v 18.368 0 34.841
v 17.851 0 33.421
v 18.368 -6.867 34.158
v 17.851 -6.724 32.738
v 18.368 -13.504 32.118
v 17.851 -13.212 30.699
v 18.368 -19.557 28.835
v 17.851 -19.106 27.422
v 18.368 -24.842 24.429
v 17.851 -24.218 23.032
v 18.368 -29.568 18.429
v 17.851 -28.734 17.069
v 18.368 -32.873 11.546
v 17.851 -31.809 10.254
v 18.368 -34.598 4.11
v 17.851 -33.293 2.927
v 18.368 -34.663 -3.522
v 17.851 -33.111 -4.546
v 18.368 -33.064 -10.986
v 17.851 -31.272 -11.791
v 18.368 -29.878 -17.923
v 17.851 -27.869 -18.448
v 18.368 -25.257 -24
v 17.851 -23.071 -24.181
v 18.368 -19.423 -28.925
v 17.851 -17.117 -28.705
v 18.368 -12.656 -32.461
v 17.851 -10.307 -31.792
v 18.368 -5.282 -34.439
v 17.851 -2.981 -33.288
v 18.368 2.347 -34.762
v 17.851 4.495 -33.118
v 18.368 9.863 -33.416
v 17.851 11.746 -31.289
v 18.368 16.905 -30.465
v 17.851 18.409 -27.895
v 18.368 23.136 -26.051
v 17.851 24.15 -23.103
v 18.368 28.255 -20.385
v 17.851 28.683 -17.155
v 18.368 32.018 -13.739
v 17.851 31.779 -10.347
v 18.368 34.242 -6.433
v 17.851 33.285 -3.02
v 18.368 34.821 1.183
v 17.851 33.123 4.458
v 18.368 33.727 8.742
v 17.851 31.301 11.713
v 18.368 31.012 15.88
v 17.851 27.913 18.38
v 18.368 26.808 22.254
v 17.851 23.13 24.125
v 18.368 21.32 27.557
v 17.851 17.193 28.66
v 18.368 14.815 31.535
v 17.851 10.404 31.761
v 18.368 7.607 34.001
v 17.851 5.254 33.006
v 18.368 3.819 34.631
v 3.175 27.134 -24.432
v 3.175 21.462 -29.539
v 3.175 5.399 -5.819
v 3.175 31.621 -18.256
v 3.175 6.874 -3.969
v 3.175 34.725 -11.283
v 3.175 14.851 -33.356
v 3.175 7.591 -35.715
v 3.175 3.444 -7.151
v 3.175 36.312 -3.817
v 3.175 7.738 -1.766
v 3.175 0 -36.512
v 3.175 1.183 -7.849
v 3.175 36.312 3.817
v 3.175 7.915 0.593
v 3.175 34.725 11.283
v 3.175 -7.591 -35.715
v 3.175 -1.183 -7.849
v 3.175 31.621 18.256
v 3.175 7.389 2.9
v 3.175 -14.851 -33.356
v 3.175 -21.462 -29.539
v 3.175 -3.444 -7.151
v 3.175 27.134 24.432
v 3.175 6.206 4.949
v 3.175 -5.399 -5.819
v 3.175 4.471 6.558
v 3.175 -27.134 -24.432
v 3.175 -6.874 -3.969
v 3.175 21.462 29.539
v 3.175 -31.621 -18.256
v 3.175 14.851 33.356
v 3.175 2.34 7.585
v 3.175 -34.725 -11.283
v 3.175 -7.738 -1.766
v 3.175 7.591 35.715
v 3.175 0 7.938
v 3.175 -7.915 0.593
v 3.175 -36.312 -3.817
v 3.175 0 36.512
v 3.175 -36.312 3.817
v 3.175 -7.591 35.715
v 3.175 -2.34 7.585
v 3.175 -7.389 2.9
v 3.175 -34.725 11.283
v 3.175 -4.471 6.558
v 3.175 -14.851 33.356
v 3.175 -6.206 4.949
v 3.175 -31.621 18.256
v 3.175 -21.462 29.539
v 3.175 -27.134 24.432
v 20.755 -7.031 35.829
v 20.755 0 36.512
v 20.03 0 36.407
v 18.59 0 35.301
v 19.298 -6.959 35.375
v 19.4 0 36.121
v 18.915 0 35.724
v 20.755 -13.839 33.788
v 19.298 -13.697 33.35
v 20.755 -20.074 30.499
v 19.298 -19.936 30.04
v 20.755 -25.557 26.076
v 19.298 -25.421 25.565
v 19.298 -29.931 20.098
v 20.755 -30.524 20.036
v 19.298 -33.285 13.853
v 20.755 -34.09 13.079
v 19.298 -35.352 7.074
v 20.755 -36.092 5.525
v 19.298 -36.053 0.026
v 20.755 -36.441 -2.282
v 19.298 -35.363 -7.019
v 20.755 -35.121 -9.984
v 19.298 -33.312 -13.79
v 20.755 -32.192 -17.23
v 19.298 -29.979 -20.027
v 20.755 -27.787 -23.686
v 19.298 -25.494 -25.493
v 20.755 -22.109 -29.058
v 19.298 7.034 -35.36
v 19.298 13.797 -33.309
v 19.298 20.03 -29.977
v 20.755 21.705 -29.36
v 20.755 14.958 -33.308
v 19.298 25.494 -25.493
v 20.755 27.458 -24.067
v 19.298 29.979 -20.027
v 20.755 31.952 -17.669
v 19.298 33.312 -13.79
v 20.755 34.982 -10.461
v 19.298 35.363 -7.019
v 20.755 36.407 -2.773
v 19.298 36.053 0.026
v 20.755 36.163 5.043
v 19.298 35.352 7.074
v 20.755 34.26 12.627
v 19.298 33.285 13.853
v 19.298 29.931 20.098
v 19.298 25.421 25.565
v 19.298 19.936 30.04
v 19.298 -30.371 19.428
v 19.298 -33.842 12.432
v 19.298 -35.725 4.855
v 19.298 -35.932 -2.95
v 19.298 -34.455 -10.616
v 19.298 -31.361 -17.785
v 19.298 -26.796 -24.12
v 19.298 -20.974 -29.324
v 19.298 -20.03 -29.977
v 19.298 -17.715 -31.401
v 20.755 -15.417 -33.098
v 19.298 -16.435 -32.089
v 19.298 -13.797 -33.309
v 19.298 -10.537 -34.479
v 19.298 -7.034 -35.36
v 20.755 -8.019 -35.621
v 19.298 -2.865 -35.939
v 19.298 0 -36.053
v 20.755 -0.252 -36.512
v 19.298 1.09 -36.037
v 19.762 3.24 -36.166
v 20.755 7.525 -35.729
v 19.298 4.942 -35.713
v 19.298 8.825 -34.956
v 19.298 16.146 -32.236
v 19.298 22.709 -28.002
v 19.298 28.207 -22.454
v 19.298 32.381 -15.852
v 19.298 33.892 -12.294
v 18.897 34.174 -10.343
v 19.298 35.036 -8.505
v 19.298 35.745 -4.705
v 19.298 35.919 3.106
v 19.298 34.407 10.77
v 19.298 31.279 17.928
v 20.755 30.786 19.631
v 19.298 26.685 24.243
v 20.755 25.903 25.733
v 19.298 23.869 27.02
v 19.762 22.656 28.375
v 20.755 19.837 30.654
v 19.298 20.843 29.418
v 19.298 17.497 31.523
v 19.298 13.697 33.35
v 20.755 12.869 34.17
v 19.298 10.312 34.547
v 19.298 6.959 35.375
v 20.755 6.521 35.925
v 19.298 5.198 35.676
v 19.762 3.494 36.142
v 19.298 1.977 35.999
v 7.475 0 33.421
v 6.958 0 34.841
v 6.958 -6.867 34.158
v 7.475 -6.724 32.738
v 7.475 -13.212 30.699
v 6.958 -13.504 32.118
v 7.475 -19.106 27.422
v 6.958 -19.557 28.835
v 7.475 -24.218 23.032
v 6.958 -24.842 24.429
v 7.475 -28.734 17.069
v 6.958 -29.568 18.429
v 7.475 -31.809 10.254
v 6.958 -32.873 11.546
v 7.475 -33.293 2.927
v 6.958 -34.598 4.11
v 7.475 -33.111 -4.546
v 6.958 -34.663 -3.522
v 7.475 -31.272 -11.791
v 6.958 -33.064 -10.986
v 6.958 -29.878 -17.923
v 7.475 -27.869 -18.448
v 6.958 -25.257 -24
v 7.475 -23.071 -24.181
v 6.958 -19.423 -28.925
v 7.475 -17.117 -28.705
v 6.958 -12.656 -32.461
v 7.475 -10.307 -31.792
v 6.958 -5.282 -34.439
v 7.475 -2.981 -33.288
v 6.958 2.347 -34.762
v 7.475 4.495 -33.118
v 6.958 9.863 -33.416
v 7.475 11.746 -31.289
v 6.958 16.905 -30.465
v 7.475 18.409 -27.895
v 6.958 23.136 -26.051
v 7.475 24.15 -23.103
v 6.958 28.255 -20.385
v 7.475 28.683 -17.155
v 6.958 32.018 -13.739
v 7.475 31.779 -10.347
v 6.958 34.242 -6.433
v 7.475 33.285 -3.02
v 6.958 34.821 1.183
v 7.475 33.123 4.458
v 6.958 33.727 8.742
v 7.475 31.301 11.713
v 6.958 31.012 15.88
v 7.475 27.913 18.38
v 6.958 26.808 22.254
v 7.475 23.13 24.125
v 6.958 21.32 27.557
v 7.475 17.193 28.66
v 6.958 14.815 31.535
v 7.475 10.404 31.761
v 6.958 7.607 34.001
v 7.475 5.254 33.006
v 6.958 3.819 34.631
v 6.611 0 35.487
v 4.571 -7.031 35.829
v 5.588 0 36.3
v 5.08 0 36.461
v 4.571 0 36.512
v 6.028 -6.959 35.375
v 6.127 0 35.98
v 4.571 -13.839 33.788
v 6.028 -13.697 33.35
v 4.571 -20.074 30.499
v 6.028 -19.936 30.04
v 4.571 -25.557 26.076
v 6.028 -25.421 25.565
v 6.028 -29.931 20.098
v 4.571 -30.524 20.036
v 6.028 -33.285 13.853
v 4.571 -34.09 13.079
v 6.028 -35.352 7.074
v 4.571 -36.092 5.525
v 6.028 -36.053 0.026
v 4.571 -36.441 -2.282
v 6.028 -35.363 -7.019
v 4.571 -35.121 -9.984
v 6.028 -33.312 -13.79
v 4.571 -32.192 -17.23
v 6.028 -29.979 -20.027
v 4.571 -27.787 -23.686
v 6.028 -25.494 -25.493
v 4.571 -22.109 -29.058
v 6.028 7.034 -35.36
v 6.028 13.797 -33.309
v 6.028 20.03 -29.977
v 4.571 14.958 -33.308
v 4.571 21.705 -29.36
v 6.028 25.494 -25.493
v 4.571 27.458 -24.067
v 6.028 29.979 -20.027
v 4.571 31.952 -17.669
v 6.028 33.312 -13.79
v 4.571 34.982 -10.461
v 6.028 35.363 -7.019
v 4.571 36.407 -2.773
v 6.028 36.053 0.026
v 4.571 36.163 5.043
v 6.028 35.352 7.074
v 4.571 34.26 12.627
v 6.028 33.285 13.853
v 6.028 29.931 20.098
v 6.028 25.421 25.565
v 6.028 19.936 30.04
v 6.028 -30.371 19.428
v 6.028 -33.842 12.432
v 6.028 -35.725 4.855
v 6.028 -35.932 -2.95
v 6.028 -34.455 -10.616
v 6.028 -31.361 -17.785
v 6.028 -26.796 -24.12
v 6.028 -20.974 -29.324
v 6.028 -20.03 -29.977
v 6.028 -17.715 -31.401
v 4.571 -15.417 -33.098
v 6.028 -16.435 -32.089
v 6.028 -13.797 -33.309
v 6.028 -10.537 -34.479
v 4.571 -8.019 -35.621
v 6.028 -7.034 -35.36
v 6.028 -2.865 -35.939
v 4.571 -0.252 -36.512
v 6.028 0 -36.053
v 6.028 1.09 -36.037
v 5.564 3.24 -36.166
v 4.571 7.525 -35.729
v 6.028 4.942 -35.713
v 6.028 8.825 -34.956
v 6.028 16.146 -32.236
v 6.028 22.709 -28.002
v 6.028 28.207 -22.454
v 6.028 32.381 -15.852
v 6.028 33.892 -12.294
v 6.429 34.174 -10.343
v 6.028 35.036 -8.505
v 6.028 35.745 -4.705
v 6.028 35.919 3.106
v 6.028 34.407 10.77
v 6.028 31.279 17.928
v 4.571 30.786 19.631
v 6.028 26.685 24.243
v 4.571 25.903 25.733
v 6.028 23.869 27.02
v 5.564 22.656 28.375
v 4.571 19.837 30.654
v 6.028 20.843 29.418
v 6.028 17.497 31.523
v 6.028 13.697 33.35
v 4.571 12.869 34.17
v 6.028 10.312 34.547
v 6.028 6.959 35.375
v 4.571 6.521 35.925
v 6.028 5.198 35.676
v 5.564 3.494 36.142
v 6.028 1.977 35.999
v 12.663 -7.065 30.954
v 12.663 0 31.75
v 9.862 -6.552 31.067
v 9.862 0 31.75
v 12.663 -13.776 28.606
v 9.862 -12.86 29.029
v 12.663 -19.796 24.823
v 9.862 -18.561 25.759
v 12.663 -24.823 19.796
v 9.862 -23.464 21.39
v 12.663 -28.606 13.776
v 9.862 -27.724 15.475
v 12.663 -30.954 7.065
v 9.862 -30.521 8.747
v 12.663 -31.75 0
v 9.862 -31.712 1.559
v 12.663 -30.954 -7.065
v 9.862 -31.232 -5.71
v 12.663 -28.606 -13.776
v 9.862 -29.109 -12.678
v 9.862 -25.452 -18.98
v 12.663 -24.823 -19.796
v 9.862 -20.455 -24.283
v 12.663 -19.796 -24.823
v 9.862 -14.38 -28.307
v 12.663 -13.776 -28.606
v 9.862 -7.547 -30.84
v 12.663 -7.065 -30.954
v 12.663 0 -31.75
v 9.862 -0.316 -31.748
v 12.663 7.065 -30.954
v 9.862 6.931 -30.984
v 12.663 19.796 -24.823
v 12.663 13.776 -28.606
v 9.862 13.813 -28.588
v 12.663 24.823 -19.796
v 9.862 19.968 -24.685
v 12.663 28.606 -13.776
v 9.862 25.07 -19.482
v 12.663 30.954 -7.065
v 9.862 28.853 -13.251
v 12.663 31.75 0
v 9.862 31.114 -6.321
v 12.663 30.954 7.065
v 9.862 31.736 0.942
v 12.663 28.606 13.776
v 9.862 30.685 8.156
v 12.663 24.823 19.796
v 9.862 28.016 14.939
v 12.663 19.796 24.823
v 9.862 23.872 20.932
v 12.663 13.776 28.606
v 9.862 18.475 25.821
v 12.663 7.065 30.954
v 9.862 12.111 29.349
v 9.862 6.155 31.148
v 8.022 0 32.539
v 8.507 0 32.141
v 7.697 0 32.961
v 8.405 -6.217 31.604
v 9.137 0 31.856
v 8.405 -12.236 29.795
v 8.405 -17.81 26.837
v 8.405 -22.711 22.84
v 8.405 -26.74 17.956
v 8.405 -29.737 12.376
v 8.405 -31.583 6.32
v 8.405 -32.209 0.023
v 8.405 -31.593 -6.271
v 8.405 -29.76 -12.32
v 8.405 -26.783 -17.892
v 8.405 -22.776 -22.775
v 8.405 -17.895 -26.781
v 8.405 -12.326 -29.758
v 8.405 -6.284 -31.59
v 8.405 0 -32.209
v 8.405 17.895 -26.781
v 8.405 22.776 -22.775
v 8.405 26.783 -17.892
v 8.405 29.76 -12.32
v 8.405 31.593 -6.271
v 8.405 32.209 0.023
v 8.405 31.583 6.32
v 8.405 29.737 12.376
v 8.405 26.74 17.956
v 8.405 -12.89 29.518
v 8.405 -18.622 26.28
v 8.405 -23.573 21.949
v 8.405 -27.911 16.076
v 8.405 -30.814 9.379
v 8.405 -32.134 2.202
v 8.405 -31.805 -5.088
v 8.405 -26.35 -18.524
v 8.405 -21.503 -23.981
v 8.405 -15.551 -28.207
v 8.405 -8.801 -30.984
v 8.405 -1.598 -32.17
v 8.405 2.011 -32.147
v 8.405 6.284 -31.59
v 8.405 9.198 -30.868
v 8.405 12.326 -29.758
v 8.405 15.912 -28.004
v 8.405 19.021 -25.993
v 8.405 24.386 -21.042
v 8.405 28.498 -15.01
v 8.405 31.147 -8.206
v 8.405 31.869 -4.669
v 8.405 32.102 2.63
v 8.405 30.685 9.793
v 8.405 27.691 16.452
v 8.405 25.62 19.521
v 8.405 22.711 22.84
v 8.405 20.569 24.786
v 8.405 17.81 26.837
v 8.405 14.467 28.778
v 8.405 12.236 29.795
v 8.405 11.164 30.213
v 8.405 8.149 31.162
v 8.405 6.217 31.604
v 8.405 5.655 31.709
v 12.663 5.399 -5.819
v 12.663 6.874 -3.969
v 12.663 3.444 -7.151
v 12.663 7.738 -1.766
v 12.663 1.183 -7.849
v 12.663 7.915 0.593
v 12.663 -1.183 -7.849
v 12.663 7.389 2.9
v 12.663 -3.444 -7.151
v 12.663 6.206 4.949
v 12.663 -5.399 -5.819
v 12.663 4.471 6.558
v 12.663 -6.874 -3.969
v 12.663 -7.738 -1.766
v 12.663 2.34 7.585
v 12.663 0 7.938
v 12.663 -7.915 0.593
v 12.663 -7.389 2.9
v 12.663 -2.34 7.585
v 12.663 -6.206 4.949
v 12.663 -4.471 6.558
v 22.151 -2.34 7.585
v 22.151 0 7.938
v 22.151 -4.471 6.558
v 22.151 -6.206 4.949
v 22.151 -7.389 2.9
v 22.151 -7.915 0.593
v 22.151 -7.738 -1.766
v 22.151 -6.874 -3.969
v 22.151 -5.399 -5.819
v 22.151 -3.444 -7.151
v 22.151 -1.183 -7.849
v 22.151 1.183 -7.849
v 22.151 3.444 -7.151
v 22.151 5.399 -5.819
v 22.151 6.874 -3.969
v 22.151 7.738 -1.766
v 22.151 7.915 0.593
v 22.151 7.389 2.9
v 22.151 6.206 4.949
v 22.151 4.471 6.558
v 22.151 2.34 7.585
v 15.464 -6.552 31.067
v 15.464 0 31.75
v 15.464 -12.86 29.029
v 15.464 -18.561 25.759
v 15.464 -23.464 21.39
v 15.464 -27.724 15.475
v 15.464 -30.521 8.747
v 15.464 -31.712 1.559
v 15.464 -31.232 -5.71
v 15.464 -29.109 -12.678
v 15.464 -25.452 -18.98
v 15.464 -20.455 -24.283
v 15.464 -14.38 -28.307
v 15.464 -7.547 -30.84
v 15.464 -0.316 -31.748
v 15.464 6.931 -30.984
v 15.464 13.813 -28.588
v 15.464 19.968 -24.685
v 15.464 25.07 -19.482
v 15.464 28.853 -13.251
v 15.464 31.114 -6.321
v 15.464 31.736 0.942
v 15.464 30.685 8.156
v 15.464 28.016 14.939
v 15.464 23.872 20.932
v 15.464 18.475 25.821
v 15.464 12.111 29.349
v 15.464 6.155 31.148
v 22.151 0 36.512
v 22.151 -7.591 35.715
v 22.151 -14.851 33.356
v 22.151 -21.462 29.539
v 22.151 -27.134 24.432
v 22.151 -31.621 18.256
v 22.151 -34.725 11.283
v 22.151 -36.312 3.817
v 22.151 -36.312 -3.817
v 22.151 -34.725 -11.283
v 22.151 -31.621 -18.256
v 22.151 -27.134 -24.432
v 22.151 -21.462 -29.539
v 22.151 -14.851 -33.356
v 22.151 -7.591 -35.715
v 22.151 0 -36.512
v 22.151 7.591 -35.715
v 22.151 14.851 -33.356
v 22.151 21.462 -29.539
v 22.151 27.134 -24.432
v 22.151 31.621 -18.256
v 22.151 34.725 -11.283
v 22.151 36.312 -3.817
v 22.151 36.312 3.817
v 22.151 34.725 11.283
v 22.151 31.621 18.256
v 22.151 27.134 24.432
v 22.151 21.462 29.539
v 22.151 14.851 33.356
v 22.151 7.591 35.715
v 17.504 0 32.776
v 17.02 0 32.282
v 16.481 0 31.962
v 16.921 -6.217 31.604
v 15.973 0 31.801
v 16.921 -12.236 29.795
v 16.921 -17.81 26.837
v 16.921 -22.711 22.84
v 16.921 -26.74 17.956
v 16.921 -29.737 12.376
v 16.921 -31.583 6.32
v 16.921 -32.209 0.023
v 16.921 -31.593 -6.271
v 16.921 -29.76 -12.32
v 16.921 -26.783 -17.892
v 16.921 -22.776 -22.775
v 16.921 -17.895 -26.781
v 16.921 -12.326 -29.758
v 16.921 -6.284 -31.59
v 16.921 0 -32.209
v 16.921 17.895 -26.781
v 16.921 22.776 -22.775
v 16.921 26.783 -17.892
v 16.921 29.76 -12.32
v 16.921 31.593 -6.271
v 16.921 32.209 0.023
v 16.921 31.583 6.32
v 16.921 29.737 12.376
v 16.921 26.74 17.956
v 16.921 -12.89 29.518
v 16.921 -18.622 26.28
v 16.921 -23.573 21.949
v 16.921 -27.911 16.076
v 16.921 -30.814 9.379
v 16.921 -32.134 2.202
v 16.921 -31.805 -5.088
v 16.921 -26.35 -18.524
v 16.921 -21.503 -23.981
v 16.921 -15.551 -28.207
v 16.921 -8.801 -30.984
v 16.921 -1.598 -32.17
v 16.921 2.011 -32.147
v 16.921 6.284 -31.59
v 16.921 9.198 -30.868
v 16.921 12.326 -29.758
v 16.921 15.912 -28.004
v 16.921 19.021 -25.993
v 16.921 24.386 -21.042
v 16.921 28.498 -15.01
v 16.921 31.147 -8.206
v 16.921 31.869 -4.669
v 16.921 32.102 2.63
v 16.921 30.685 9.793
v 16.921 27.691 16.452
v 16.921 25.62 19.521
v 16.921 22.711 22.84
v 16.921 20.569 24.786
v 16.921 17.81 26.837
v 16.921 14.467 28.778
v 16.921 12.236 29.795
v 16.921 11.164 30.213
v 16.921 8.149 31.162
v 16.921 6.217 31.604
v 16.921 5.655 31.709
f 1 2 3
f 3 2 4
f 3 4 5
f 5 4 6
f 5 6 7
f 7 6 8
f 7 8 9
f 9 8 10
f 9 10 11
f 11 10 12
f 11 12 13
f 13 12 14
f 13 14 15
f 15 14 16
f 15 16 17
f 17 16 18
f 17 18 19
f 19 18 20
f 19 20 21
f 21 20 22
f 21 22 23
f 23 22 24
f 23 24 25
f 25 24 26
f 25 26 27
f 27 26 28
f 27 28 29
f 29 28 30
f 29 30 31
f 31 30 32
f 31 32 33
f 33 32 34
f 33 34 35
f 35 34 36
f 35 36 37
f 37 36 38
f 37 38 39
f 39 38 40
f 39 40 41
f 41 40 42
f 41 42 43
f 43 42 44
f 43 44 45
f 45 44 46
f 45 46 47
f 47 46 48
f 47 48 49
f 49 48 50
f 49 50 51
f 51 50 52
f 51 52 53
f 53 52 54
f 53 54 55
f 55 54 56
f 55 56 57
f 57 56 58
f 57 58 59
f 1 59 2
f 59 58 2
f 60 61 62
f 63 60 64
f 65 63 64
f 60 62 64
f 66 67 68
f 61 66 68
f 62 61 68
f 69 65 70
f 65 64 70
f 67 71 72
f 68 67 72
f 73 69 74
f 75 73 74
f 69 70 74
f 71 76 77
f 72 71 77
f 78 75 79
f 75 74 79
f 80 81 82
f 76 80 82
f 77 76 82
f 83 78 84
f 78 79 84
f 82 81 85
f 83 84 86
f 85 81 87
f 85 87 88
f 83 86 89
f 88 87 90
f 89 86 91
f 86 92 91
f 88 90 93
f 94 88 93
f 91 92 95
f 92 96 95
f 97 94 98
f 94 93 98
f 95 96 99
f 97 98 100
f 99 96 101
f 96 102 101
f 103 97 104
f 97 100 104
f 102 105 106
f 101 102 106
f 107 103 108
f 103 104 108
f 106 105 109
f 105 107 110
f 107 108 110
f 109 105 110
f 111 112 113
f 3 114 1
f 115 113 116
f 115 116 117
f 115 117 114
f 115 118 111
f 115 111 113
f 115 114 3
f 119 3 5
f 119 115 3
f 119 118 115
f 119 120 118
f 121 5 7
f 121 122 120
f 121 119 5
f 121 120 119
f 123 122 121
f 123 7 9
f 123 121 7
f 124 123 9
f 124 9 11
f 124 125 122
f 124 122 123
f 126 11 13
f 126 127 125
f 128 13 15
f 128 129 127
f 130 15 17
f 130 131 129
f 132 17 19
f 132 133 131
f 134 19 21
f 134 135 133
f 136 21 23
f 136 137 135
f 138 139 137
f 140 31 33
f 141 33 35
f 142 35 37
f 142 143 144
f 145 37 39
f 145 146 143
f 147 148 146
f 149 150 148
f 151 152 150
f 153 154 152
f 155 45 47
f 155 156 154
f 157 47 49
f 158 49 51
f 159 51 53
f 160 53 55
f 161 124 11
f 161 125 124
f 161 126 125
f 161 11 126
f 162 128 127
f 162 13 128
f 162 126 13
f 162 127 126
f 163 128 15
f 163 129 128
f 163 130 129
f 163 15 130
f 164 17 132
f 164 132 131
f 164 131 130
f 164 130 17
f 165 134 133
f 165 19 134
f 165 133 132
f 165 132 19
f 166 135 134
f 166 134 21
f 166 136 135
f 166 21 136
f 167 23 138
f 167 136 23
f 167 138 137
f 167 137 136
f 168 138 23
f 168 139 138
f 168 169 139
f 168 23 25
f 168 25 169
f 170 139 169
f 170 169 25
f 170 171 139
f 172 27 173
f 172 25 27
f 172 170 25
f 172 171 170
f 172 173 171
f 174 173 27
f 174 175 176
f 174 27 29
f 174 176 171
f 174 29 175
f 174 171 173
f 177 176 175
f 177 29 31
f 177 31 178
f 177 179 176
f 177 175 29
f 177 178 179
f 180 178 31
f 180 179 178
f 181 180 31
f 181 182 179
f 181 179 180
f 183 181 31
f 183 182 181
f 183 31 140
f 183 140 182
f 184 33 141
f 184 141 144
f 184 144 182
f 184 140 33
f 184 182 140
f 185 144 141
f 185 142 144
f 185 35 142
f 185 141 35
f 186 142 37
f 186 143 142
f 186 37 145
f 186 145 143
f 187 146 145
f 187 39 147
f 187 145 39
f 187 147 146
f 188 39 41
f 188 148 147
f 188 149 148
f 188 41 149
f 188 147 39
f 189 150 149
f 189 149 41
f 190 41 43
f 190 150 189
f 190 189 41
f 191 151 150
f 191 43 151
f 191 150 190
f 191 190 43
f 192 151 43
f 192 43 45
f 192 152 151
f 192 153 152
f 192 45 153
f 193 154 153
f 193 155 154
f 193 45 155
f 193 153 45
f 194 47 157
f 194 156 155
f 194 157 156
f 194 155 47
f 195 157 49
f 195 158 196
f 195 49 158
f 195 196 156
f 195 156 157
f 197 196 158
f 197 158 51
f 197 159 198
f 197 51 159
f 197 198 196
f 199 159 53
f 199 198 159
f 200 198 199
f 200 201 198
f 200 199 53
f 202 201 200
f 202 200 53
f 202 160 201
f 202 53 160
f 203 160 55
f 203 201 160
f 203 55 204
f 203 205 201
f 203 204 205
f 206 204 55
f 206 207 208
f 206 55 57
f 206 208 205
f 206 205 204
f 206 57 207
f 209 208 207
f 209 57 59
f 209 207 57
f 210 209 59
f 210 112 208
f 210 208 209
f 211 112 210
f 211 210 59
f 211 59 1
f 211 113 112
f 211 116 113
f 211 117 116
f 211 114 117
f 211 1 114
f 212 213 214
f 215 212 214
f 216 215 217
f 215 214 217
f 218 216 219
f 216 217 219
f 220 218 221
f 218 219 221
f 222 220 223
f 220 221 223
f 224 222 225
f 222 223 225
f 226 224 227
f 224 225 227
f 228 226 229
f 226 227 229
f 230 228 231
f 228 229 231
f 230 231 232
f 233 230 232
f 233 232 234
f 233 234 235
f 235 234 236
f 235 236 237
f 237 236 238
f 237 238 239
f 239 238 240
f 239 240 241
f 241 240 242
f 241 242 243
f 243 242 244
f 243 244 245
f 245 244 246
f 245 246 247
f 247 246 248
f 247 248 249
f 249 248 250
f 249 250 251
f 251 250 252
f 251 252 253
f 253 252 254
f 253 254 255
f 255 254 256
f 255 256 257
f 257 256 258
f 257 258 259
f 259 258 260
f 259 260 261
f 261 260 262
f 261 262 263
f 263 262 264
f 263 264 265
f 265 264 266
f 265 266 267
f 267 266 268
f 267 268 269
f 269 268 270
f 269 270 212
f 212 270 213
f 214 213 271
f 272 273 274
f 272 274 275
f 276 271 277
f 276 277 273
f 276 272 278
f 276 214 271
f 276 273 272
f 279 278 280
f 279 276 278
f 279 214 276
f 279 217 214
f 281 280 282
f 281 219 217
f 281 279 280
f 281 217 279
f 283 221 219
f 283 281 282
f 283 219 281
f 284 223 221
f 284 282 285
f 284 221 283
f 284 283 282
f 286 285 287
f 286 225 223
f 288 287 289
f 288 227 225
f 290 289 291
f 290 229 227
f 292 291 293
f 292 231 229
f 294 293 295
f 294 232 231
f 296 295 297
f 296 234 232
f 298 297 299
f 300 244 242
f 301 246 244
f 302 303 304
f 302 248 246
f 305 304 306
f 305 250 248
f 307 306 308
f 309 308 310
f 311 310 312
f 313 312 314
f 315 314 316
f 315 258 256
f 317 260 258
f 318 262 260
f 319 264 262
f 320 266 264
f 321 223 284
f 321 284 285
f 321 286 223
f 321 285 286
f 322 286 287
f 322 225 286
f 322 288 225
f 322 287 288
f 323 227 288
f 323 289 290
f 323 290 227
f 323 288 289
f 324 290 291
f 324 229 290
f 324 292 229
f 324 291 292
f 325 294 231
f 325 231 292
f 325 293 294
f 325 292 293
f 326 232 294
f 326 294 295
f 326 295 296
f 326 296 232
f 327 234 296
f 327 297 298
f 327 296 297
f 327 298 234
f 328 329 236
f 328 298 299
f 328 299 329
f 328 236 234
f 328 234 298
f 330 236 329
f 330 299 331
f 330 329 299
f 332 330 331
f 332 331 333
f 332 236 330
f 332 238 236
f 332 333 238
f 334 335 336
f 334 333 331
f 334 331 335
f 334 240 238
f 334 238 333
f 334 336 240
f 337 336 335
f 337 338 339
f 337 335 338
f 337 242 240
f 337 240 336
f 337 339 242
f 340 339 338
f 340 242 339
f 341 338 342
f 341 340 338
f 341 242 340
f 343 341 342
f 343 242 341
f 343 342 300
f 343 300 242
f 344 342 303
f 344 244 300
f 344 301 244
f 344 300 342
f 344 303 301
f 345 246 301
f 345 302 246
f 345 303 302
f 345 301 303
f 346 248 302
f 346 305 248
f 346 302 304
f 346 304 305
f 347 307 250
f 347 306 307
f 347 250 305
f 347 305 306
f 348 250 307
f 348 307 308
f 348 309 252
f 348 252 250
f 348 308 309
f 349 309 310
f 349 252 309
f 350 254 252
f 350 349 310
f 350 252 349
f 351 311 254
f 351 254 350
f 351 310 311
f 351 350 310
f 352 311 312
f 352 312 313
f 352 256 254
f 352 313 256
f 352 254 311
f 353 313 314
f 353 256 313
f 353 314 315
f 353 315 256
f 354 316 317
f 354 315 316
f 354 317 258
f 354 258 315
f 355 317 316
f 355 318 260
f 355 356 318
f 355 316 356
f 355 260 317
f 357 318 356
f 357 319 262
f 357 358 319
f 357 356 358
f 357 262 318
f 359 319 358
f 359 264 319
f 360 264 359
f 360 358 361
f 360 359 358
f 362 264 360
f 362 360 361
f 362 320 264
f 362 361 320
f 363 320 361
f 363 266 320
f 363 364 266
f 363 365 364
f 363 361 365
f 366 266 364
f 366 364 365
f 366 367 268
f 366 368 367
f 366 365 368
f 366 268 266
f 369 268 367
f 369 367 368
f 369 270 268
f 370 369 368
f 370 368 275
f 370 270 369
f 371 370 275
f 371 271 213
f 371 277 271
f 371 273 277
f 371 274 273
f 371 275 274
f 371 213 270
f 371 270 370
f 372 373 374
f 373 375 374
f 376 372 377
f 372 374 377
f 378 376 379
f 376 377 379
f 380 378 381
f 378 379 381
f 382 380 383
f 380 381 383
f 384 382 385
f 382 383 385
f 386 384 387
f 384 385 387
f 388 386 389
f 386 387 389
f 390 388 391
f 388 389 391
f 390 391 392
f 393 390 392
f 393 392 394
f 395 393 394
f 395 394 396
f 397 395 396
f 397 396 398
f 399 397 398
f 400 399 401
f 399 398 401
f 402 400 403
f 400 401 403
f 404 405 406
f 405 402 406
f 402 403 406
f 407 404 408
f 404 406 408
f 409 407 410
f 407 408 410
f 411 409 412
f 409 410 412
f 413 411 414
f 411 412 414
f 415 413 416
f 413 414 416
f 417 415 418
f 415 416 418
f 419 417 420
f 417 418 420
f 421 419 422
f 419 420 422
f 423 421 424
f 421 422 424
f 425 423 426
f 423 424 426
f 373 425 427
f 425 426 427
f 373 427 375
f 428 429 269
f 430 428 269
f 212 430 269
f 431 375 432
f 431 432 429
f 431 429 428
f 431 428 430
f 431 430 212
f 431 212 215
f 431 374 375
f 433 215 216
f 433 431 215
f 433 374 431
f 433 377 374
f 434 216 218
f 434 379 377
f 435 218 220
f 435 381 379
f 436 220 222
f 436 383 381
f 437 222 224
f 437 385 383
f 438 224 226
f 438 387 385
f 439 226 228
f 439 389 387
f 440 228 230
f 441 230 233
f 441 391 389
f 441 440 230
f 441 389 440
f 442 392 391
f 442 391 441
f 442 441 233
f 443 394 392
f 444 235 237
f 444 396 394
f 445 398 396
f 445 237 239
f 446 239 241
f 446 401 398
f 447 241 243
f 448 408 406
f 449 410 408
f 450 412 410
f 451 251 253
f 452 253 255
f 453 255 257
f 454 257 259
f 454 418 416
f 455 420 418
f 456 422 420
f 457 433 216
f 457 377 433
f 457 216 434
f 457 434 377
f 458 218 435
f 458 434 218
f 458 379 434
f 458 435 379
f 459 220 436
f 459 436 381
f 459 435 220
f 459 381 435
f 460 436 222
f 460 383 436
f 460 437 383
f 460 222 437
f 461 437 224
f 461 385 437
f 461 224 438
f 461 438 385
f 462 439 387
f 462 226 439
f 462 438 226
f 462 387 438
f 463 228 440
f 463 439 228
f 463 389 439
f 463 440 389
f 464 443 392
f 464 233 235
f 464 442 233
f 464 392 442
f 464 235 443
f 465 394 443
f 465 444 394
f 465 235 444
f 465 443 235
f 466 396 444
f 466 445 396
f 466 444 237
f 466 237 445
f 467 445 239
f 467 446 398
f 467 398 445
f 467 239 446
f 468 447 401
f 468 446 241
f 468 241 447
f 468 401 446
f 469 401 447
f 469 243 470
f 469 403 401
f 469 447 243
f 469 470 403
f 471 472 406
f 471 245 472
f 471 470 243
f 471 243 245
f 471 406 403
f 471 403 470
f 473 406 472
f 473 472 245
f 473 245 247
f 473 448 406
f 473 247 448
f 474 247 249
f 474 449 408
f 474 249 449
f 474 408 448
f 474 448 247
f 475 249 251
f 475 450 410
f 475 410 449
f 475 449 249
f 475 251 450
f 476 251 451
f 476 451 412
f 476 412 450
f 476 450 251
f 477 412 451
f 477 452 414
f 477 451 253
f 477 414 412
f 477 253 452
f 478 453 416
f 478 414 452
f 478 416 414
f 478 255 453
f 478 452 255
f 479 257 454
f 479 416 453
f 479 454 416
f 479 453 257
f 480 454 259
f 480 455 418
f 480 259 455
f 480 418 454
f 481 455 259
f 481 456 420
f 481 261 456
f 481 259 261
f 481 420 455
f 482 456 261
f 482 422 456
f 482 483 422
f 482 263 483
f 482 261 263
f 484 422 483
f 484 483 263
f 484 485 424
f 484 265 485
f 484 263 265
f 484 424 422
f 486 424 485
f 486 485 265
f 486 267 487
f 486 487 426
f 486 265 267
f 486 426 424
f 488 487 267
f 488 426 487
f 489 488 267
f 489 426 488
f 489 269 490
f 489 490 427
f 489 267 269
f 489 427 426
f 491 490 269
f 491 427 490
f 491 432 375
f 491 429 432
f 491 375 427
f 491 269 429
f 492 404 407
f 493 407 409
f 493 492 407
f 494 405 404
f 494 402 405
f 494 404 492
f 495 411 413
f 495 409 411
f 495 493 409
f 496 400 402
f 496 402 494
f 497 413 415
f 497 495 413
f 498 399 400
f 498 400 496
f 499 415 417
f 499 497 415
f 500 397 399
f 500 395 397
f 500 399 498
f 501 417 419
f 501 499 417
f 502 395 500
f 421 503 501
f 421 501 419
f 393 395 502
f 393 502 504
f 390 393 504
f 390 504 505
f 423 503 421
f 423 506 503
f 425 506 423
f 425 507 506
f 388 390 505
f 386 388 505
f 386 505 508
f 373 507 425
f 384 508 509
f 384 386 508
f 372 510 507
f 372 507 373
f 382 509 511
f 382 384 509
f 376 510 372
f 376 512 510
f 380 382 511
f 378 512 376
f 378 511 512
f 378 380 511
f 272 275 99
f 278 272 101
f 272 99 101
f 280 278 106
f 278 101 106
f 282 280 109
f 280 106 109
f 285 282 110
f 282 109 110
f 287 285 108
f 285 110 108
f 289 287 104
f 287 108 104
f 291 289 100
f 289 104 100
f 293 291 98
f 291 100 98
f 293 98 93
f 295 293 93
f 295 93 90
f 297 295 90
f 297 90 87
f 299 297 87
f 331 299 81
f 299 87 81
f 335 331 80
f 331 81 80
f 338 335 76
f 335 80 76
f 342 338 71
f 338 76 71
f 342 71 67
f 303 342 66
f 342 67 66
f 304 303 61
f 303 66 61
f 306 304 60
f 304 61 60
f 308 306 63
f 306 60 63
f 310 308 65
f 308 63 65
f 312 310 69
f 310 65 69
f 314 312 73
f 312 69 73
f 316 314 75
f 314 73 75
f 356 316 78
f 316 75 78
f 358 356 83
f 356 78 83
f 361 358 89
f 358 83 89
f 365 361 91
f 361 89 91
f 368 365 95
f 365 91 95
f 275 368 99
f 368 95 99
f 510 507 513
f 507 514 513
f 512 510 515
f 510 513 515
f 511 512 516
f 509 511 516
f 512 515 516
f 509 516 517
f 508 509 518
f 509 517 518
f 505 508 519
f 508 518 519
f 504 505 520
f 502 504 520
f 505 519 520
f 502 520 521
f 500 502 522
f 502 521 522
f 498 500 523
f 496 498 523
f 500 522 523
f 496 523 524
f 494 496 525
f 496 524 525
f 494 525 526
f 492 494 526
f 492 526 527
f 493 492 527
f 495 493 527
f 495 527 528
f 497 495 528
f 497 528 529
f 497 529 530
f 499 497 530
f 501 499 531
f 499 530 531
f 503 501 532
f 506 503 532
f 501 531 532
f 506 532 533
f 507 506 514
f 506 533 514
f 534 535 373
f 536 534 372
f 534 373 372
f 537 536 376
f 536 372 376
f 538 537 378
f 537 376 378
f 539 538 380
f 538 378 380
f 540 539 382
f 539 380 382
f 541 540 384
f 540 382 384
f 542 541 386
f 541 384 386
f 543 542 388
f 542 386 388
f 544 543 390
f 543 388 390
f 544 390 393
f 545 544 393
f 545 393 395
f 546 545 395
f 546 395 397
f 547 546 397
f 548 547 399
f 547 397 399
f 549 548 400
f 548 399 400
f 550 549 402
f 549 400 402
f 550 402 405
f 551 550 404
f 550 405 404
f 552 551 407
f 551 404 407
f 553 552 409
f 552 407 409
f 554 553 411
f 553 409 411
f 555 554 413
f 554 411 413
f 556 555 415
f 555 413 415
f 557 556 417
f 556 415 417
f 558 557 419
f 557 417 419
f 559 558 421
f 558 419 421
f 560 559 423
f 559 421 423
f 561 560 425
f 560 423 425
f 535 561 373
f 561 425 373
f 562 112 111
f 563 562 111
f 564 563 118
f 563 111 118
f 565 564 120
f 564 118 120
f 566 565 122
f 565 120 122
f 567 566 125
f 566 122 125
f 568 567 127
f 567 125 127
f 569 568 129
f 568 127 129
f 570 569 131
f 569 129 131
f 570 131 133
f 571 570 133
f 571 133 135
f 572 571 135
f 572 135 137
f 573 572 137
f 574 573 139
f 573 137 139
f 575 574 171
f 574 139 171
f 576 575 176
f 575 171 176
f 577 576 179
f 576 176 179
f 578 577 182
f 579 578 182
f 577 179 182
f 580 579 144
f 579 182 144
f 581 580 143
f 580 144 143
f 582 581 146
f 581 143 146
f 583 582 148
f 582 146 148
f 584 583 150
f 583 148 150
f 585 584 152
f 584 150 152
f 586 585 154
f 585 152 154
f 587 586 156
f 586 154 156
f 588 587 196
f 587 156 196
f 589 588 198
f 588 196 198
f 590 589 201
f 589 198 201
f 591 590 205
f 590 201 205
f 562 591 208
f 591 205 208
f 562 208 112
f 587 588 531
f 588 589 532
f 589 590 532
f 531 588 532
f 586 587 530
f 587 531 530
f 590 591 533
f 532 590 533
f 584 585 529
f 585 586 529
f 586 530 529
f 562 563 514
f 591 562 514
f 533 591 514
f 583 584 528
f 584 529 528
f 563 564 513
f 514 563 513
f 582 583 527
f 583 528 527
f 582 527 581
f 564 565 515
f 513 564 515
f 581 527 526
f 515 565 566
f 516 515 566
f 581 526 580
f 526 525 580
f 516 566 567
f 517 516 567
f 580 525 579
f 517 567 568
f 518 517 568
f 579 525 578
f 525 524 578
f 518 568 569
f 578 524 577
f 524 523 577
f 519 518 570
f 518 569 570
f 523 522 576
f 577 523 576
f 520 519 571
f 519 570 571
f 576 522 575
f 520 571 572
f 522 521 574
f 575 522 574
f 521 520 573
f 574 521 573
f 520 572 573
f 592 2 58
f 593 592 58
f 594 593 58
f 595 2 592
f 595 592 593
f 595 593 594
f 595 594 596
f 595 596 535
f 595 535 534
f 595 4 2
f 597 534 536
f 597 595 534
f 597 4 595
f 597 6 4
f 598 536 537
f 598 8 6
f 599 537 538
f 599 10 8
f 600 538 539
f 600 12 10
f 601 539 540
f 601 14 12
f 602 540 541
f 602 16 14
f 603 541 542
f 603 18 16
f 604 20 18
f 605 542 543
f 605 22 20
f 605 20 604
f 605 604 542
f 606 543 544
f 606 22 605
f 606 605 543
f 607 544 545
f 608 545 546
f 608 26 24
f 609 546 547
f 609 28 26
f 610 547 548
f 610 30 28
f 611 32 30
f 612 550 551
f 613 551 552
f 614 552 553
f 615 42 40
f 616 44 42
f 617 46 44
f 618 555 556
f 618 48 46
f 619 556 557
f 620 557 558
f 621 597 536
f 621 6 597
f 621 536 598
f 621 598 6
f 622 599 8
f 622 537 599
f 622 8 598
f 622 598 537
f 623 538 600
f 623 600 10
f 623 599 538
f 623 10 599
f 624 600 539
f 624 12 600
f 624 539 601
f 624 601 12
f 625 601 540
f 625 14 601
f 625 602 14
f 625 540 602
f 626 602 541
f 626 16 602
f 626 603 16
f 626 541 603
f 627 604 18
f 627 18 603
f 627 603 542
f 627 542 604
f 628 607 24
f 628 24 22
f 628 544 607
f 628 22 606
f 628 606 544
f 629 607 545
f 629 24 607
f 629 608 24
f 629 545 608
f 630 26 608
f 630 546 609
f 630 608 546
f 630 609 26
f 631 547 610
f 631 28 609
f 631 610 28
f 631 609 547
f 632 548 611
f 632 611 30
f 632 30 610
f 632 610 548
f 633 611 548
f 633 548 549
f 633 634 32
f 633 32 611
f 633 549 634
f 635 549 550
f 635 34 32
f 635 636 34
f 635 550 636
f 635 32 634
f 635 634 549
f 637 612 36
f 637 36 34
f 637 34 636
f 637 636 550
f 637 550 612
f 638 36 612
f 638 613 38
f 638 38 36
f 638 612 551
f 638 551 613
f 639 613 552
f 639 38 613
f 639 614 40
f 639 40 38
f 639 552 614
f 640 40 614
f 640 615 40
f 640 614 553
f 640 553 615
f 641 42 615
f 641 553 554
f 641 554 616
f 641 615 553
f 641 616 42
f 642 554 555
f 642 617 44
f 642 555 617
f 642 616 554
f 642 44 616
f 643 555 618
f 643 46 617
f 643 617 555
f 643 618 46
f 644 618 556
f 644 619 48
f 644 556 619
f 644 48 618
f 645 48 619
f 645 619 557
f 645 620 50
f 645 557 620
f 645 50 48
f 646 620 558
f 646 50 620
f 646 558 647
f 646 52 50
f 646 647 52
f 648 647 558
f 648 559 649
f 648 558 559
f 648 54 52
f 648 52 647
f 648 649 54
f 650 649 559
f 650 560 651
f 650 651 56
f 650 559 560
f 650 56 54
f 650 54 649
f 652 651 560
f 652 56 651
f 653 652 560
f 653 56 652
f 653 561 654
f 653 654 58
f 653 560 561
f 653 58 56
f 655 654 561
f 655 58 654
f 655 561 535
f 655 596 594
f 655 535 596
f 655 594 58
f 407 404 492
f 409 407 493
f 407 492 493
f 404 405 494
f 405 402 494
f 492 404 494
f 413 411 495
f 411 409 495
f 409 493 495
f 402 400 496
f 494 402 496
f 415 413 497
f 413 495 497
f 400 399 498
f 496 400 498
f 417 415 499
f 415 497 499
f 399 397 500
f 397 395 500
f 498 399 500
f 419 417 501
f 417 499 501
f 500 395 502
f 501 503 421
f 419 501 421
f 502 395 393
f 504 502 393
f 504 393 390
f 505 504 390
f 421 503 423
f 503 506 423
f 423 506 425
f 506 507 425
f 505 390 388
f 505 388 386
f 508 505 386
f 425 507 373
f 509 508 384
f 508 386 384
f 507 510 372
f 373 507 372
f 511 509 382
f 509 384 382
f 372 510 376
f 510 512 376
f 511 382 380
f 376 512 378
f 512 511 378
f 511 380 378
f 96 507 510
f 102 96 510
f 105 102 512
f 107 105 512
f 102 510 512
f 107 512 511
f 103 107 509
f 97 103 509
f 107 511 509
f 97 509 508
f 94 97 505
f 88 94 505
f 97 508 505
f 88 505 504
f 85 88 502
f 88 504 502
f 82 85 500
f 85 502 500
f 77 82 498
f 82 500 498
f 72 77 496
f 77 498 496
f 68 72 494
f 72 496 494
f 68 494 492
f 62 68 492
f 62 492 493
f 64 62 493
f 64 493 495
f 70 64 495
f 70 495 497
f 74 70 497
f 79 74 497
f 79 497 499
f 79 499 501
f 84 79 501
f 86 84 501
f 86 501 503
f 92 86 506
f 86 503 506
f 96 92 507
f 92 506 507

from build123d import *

# Parameters (mm, degrees)
FILLET1_R = 2.54


with BuildPart() as part:
    # Sketch2 → Revolve1 (revolve)
    with BuildSketch(Plane.XY, mode=Mode.PRIVATE) as revolve1_sk:
        Polygon((3.175, 7.9375), (22.1514, 7.9375), (22.1514, 36.5125), (18.9764, 36.5125), (17.242991759, 31.75), (8.083408241, 31.75), (6.35, 36.5125), (3.175, 36.5125), align=None)
    revolve(revolve1_sk.sketch.rotate(Axis((-22.1514, 0, 0), (1, 0, 0)), 90), axis=Axis((-22.1514, 0, 0), (1, 0, 0)))

    # Fillet1
    fillet1_edges = [part.edges().sort_by_distance(p)[0] for p in [
        (6.35, 0, -36.5125),
        (8.083408241, 0, -31.75),
        (17.242991759, 0, -31.75),
        (18.9764, 0, -36.5125),
    ]]
    fillet(fillet1_edges, radius=FILLET1_R)


with BuildPart() as body_2:
    # Split1: the piece on the far side of the plane
    add(part.part)
    split(bisect_by=Plane(origin=(12.6632, 0, 0), x_dir=(0, 0, 1), z_dir=(1, 0, 0)), keep=Keep.BOTTOM)


with BuildPart() as part_1:
    add(part.part)

    # Split1
    split(bisect_by=Plane(origin=(12.6632, 0, 0), x_dir=(0, 0, 1), z_dir=(1, 0, 0)), keep=Keep.TOP)


solid = Compound([body_2.part, part_1.part])
